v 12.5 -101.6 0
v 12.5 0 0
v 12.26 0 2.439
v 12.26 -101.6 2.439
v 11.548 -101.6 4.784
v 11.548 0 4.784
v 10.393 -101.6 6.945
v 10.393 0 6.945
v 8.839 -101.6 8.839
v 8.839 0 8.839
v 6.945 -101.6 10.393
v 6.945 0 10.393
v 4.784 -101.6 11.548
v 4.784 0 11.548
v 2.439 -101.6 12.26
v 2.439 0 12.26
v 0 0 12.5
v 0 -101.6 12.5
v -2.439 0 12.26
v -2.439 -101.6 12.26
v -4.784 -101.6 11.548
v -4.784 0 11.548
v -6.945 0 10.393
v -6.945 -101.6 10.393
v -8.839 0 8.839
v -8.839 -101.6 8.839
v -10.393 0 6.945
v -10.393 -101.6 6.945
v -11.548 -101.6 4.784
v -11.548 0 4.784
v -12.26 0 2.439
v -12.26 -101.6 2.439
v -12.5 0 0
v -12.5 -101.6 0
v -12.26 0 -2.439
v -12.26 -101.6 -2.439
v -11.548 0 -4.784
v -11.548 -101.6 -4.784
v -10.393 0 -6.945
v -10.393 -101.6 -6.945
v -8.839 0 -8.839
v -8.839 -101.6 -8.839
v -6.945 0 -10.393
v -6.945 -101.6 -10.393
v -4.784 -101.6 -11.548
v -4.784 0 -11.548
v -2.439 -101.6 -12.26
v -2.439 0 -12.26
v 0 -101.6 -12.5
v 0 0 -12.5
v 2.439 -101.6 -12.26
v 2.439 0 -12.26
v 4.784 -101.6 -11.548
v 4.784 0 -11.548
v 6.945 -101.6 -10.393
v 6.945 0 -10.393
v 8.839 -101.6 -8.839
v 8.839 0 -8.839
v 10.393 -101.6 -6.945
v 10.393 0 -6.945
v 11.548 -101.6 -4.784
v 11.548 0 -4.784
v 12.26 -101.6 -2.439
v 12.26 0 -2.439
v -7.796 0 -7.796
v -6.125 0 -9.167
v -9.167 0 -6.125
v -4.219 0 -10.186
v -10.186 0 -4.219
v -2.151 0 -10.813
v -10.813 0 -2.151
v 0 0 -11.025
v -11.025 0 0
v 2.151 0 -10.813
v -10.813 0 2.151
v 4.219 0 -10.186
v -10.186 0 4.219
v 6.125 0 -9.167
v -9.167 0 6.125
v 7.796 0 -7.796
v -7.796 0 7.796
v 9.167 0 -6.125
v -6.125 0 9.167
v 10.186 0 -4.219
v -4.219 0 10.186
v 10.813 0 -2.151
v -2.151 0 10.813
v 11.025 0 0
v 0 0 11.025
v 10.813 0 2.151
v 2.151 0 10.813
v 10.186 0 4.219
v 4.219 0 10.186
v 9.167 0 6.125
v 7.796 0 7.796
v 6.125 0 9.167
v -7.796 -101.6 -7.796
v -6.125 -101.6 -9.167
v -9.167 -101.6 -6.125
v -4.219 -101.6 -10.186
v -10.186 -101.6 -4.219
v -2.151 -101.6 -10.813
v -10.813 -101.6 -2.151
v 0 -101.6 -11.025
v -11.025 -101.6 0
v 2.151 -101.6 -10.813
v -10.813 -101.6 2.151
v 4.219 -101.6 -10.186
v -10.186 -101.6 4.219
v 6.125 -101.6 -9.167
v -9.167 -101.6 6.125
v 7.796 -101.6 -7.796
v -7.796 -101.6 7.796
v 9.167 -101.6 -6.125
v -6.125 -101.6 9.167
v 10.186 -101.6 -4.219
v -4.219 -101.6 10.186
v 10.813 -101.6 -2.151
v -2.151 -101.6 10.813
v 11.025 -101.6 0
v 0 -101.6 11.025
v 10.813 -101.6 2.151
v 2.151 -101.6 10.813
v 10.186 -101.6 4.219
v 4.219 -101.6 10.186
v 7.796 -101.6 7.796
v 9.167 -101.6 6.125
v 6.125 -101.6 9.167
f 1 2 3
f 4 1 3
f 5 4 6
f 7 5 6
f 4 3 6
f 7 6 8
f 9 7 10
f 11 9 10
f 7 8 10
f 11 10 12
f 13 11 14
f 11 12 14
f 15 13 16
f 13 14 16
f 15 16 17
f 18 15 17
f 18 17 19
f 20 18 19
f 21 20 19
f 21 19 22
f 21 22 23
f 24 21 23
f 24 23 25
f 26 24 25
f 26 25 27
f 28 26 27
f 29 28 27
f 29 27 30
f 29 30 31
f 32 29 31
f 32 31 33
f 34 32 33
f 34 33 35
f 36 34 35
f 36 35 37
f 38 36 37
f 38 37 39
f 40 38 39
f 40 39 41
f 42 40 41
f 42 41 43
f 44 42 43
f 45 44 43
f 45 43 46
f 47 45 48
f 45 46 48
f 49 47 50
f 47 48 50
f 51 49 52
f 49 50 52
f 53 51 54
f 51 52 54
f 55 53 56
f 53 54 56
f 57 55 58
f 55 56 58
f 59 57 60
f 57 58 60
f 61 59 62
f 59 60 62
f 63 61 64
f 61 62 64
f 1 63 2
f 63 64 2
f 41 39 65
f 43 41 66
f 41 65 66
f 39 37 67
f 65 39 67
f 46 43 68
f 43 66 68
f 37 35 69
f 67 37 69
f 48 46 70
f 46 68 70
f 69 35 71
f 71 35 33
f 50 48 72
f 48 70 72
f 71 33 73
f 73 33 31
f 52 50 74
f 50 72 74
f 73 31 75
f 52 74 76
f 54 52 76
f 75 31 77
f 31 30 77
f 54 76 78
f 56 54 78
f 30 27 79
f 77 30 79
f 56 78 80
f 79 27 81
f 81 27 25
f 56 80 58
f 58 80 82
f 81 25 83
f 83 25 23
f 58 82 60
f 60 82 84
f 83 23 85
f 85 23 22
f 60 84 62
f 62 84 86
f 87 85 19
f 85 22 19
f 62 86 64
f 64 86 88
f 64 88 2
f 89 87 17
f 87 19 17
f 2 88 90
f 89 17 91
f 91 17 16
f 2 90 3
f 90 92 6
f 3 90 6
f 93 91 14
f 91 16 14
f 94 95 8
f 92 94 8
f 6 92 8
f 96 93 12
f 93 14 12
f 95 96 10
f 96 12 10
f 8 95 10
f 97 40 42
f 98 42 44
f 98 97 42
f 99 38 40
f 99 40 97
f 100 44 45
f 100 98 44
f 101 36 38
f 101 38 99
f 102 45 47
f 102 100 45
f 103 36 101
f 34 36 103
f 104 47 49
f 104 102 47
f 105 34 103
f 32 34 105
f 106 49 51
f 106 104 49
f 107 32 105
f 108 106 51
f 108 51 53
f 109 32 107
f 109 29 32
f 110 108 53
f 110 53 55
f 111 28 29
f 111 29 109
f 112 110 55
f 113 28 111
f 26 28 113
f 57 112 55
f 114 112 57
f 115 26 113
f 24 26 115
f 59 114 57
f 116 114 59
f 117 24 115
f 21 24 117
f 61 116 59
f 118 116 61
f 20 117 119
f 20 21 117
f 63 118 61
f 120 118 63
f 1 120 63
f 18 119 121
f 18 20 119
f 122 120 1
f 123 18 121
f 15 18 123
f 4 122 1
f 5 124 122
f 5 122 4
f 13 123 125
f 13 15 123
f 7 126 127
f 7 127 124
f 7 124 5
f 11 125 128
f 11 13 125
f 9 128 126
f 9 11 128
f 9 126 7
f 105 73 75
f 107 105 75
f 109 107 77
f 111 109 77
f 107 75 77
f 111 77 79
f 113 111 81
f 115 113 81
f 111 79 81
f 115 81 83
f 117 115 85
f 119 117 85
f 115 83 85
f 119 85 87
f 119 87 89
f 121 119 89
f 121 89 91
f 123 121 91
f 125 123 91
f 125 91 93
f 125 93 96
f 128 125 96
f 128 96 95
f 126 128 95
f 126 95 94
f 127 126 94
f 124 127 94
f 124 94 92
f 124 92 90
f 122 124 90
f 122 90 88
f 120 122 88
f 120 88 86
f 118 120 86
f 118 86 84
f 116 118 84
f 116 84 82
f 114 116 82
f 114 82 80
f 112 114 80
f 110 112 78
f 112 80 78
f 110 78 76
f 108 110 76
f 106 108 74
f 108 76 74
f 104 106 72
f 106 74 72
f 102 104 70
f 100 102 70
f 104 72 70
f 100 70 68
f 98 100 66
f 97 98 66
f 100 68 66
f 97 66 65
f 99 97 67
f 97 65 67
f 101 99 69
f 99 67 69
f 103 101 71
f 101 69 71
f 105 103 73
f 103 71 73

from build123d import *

# Parameters (mm, degrees)
F0_R     = 12.5
F1_DEPTH = 101.6
F2_DEPTH = 25.4
F3_R     = 11.025
F4_DEPTH = 291.084


with BuildPart() as f1:
    # F0 (on Front) → F1 (new body)
    with BuildSketch(Plane.XZ):
        Circle(F0_R)
    extrude(amount=F1_DEPTH)

    # F0 (on Front) → F2 (join)
    with BuildSketch(Plane.XZ):
        Circle(F0_R)
    extrude(amount=F2_DEPTH)

    # F3 (on face) → F4 (cut)
    with BuildSketch(Plane(origin=(0, 0, 0), x_dir=(-1, 0, 0), z_dir=(0, 1, 0))):
        Circle(F3_R)
    extrude(amount=-F4_DEPTH, mode=Mode.SUBTRACT)


solid = f1.part
